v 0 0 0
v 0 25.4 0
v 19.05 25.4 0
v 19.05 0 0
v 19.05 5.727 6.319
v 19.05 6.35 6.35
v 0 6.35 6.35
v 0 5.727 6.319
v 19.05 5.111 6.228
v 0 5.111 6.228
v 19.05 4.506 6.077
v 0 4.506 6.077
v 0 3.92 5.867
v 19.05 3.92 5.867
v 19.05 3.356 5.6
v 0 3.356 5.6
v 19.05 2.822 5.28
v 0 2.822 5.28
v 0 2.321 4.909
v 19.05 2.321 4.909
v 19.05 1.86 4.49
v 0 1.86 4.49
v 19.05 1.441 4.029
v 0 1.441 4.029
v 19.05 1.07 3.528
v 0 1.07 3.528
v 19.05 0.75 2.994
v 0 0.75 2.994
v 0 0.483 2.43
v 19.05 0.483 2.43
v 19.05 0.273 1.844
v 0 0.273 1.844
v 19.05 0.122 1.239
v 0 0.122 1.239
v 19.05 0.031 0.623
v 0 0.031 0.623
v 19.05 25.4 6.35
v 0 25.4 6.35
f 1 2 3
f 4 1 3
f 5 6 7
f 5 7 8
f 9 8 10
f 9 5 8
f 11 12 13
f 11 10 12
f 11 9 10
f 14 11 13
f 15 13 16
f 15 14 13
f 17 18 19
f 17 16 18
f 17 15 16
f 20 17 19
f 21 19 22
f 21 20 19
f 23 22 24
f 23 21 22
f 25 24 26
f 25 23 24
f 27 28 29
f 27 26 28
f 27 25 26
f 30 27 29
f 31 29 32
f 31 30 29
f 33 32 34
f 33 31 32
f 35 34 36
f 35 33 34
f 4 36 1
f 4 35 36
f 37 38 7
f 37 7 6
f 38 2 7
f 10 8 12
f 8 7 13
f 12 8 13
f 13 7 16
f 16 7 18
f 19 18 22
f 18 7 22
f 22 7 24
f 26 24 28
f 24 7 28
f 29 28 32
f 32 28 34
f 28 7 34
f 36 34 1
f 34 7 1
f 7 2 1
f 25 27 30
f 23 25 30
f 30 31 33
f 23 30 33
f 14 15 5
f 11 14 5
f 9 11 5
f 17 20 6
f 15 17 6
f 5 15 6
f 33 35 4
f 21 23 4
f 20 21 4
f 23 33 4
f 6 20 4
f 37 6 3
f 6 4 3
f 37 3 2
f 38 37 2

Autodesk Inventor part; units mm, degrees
ref_plane "YZ Plane" through (0, 0, 0) normal (1, 0, 0) x (0, 1, 0)
ref_plane "XZ Plane" through (0, 0, 0) normal (0, 1, 0) x (-1, 0, 0)
ref_plane "XY Plane" through (0, 0, 0) normal (0, 0, 1) x (1, 0, 0)
sketch "Sketch1" plane through (0, 0, 0) normal (0, 0, 1) x (1, 0, 0)
  line L0 (0, 0) -> (19.05, 0)
  line L1 (19.05, 0) -> (19.05, 25.4)
  line L2 (19.05, 25.4) -> (0, 25.4)
  line L3 (0, 25.4) -> (0, 0)
  dimension "d0" = 19.05
  dimension "d1" = 25.4
extrude "Extrusion1" add sketch "Sketch1" along normal blind 6.35
fillet "Fillet1" radius 6.35 1 edges at (9.525, 0, 6.35)
properties part number "spacer_block" material "Acetal Resin, Black"
